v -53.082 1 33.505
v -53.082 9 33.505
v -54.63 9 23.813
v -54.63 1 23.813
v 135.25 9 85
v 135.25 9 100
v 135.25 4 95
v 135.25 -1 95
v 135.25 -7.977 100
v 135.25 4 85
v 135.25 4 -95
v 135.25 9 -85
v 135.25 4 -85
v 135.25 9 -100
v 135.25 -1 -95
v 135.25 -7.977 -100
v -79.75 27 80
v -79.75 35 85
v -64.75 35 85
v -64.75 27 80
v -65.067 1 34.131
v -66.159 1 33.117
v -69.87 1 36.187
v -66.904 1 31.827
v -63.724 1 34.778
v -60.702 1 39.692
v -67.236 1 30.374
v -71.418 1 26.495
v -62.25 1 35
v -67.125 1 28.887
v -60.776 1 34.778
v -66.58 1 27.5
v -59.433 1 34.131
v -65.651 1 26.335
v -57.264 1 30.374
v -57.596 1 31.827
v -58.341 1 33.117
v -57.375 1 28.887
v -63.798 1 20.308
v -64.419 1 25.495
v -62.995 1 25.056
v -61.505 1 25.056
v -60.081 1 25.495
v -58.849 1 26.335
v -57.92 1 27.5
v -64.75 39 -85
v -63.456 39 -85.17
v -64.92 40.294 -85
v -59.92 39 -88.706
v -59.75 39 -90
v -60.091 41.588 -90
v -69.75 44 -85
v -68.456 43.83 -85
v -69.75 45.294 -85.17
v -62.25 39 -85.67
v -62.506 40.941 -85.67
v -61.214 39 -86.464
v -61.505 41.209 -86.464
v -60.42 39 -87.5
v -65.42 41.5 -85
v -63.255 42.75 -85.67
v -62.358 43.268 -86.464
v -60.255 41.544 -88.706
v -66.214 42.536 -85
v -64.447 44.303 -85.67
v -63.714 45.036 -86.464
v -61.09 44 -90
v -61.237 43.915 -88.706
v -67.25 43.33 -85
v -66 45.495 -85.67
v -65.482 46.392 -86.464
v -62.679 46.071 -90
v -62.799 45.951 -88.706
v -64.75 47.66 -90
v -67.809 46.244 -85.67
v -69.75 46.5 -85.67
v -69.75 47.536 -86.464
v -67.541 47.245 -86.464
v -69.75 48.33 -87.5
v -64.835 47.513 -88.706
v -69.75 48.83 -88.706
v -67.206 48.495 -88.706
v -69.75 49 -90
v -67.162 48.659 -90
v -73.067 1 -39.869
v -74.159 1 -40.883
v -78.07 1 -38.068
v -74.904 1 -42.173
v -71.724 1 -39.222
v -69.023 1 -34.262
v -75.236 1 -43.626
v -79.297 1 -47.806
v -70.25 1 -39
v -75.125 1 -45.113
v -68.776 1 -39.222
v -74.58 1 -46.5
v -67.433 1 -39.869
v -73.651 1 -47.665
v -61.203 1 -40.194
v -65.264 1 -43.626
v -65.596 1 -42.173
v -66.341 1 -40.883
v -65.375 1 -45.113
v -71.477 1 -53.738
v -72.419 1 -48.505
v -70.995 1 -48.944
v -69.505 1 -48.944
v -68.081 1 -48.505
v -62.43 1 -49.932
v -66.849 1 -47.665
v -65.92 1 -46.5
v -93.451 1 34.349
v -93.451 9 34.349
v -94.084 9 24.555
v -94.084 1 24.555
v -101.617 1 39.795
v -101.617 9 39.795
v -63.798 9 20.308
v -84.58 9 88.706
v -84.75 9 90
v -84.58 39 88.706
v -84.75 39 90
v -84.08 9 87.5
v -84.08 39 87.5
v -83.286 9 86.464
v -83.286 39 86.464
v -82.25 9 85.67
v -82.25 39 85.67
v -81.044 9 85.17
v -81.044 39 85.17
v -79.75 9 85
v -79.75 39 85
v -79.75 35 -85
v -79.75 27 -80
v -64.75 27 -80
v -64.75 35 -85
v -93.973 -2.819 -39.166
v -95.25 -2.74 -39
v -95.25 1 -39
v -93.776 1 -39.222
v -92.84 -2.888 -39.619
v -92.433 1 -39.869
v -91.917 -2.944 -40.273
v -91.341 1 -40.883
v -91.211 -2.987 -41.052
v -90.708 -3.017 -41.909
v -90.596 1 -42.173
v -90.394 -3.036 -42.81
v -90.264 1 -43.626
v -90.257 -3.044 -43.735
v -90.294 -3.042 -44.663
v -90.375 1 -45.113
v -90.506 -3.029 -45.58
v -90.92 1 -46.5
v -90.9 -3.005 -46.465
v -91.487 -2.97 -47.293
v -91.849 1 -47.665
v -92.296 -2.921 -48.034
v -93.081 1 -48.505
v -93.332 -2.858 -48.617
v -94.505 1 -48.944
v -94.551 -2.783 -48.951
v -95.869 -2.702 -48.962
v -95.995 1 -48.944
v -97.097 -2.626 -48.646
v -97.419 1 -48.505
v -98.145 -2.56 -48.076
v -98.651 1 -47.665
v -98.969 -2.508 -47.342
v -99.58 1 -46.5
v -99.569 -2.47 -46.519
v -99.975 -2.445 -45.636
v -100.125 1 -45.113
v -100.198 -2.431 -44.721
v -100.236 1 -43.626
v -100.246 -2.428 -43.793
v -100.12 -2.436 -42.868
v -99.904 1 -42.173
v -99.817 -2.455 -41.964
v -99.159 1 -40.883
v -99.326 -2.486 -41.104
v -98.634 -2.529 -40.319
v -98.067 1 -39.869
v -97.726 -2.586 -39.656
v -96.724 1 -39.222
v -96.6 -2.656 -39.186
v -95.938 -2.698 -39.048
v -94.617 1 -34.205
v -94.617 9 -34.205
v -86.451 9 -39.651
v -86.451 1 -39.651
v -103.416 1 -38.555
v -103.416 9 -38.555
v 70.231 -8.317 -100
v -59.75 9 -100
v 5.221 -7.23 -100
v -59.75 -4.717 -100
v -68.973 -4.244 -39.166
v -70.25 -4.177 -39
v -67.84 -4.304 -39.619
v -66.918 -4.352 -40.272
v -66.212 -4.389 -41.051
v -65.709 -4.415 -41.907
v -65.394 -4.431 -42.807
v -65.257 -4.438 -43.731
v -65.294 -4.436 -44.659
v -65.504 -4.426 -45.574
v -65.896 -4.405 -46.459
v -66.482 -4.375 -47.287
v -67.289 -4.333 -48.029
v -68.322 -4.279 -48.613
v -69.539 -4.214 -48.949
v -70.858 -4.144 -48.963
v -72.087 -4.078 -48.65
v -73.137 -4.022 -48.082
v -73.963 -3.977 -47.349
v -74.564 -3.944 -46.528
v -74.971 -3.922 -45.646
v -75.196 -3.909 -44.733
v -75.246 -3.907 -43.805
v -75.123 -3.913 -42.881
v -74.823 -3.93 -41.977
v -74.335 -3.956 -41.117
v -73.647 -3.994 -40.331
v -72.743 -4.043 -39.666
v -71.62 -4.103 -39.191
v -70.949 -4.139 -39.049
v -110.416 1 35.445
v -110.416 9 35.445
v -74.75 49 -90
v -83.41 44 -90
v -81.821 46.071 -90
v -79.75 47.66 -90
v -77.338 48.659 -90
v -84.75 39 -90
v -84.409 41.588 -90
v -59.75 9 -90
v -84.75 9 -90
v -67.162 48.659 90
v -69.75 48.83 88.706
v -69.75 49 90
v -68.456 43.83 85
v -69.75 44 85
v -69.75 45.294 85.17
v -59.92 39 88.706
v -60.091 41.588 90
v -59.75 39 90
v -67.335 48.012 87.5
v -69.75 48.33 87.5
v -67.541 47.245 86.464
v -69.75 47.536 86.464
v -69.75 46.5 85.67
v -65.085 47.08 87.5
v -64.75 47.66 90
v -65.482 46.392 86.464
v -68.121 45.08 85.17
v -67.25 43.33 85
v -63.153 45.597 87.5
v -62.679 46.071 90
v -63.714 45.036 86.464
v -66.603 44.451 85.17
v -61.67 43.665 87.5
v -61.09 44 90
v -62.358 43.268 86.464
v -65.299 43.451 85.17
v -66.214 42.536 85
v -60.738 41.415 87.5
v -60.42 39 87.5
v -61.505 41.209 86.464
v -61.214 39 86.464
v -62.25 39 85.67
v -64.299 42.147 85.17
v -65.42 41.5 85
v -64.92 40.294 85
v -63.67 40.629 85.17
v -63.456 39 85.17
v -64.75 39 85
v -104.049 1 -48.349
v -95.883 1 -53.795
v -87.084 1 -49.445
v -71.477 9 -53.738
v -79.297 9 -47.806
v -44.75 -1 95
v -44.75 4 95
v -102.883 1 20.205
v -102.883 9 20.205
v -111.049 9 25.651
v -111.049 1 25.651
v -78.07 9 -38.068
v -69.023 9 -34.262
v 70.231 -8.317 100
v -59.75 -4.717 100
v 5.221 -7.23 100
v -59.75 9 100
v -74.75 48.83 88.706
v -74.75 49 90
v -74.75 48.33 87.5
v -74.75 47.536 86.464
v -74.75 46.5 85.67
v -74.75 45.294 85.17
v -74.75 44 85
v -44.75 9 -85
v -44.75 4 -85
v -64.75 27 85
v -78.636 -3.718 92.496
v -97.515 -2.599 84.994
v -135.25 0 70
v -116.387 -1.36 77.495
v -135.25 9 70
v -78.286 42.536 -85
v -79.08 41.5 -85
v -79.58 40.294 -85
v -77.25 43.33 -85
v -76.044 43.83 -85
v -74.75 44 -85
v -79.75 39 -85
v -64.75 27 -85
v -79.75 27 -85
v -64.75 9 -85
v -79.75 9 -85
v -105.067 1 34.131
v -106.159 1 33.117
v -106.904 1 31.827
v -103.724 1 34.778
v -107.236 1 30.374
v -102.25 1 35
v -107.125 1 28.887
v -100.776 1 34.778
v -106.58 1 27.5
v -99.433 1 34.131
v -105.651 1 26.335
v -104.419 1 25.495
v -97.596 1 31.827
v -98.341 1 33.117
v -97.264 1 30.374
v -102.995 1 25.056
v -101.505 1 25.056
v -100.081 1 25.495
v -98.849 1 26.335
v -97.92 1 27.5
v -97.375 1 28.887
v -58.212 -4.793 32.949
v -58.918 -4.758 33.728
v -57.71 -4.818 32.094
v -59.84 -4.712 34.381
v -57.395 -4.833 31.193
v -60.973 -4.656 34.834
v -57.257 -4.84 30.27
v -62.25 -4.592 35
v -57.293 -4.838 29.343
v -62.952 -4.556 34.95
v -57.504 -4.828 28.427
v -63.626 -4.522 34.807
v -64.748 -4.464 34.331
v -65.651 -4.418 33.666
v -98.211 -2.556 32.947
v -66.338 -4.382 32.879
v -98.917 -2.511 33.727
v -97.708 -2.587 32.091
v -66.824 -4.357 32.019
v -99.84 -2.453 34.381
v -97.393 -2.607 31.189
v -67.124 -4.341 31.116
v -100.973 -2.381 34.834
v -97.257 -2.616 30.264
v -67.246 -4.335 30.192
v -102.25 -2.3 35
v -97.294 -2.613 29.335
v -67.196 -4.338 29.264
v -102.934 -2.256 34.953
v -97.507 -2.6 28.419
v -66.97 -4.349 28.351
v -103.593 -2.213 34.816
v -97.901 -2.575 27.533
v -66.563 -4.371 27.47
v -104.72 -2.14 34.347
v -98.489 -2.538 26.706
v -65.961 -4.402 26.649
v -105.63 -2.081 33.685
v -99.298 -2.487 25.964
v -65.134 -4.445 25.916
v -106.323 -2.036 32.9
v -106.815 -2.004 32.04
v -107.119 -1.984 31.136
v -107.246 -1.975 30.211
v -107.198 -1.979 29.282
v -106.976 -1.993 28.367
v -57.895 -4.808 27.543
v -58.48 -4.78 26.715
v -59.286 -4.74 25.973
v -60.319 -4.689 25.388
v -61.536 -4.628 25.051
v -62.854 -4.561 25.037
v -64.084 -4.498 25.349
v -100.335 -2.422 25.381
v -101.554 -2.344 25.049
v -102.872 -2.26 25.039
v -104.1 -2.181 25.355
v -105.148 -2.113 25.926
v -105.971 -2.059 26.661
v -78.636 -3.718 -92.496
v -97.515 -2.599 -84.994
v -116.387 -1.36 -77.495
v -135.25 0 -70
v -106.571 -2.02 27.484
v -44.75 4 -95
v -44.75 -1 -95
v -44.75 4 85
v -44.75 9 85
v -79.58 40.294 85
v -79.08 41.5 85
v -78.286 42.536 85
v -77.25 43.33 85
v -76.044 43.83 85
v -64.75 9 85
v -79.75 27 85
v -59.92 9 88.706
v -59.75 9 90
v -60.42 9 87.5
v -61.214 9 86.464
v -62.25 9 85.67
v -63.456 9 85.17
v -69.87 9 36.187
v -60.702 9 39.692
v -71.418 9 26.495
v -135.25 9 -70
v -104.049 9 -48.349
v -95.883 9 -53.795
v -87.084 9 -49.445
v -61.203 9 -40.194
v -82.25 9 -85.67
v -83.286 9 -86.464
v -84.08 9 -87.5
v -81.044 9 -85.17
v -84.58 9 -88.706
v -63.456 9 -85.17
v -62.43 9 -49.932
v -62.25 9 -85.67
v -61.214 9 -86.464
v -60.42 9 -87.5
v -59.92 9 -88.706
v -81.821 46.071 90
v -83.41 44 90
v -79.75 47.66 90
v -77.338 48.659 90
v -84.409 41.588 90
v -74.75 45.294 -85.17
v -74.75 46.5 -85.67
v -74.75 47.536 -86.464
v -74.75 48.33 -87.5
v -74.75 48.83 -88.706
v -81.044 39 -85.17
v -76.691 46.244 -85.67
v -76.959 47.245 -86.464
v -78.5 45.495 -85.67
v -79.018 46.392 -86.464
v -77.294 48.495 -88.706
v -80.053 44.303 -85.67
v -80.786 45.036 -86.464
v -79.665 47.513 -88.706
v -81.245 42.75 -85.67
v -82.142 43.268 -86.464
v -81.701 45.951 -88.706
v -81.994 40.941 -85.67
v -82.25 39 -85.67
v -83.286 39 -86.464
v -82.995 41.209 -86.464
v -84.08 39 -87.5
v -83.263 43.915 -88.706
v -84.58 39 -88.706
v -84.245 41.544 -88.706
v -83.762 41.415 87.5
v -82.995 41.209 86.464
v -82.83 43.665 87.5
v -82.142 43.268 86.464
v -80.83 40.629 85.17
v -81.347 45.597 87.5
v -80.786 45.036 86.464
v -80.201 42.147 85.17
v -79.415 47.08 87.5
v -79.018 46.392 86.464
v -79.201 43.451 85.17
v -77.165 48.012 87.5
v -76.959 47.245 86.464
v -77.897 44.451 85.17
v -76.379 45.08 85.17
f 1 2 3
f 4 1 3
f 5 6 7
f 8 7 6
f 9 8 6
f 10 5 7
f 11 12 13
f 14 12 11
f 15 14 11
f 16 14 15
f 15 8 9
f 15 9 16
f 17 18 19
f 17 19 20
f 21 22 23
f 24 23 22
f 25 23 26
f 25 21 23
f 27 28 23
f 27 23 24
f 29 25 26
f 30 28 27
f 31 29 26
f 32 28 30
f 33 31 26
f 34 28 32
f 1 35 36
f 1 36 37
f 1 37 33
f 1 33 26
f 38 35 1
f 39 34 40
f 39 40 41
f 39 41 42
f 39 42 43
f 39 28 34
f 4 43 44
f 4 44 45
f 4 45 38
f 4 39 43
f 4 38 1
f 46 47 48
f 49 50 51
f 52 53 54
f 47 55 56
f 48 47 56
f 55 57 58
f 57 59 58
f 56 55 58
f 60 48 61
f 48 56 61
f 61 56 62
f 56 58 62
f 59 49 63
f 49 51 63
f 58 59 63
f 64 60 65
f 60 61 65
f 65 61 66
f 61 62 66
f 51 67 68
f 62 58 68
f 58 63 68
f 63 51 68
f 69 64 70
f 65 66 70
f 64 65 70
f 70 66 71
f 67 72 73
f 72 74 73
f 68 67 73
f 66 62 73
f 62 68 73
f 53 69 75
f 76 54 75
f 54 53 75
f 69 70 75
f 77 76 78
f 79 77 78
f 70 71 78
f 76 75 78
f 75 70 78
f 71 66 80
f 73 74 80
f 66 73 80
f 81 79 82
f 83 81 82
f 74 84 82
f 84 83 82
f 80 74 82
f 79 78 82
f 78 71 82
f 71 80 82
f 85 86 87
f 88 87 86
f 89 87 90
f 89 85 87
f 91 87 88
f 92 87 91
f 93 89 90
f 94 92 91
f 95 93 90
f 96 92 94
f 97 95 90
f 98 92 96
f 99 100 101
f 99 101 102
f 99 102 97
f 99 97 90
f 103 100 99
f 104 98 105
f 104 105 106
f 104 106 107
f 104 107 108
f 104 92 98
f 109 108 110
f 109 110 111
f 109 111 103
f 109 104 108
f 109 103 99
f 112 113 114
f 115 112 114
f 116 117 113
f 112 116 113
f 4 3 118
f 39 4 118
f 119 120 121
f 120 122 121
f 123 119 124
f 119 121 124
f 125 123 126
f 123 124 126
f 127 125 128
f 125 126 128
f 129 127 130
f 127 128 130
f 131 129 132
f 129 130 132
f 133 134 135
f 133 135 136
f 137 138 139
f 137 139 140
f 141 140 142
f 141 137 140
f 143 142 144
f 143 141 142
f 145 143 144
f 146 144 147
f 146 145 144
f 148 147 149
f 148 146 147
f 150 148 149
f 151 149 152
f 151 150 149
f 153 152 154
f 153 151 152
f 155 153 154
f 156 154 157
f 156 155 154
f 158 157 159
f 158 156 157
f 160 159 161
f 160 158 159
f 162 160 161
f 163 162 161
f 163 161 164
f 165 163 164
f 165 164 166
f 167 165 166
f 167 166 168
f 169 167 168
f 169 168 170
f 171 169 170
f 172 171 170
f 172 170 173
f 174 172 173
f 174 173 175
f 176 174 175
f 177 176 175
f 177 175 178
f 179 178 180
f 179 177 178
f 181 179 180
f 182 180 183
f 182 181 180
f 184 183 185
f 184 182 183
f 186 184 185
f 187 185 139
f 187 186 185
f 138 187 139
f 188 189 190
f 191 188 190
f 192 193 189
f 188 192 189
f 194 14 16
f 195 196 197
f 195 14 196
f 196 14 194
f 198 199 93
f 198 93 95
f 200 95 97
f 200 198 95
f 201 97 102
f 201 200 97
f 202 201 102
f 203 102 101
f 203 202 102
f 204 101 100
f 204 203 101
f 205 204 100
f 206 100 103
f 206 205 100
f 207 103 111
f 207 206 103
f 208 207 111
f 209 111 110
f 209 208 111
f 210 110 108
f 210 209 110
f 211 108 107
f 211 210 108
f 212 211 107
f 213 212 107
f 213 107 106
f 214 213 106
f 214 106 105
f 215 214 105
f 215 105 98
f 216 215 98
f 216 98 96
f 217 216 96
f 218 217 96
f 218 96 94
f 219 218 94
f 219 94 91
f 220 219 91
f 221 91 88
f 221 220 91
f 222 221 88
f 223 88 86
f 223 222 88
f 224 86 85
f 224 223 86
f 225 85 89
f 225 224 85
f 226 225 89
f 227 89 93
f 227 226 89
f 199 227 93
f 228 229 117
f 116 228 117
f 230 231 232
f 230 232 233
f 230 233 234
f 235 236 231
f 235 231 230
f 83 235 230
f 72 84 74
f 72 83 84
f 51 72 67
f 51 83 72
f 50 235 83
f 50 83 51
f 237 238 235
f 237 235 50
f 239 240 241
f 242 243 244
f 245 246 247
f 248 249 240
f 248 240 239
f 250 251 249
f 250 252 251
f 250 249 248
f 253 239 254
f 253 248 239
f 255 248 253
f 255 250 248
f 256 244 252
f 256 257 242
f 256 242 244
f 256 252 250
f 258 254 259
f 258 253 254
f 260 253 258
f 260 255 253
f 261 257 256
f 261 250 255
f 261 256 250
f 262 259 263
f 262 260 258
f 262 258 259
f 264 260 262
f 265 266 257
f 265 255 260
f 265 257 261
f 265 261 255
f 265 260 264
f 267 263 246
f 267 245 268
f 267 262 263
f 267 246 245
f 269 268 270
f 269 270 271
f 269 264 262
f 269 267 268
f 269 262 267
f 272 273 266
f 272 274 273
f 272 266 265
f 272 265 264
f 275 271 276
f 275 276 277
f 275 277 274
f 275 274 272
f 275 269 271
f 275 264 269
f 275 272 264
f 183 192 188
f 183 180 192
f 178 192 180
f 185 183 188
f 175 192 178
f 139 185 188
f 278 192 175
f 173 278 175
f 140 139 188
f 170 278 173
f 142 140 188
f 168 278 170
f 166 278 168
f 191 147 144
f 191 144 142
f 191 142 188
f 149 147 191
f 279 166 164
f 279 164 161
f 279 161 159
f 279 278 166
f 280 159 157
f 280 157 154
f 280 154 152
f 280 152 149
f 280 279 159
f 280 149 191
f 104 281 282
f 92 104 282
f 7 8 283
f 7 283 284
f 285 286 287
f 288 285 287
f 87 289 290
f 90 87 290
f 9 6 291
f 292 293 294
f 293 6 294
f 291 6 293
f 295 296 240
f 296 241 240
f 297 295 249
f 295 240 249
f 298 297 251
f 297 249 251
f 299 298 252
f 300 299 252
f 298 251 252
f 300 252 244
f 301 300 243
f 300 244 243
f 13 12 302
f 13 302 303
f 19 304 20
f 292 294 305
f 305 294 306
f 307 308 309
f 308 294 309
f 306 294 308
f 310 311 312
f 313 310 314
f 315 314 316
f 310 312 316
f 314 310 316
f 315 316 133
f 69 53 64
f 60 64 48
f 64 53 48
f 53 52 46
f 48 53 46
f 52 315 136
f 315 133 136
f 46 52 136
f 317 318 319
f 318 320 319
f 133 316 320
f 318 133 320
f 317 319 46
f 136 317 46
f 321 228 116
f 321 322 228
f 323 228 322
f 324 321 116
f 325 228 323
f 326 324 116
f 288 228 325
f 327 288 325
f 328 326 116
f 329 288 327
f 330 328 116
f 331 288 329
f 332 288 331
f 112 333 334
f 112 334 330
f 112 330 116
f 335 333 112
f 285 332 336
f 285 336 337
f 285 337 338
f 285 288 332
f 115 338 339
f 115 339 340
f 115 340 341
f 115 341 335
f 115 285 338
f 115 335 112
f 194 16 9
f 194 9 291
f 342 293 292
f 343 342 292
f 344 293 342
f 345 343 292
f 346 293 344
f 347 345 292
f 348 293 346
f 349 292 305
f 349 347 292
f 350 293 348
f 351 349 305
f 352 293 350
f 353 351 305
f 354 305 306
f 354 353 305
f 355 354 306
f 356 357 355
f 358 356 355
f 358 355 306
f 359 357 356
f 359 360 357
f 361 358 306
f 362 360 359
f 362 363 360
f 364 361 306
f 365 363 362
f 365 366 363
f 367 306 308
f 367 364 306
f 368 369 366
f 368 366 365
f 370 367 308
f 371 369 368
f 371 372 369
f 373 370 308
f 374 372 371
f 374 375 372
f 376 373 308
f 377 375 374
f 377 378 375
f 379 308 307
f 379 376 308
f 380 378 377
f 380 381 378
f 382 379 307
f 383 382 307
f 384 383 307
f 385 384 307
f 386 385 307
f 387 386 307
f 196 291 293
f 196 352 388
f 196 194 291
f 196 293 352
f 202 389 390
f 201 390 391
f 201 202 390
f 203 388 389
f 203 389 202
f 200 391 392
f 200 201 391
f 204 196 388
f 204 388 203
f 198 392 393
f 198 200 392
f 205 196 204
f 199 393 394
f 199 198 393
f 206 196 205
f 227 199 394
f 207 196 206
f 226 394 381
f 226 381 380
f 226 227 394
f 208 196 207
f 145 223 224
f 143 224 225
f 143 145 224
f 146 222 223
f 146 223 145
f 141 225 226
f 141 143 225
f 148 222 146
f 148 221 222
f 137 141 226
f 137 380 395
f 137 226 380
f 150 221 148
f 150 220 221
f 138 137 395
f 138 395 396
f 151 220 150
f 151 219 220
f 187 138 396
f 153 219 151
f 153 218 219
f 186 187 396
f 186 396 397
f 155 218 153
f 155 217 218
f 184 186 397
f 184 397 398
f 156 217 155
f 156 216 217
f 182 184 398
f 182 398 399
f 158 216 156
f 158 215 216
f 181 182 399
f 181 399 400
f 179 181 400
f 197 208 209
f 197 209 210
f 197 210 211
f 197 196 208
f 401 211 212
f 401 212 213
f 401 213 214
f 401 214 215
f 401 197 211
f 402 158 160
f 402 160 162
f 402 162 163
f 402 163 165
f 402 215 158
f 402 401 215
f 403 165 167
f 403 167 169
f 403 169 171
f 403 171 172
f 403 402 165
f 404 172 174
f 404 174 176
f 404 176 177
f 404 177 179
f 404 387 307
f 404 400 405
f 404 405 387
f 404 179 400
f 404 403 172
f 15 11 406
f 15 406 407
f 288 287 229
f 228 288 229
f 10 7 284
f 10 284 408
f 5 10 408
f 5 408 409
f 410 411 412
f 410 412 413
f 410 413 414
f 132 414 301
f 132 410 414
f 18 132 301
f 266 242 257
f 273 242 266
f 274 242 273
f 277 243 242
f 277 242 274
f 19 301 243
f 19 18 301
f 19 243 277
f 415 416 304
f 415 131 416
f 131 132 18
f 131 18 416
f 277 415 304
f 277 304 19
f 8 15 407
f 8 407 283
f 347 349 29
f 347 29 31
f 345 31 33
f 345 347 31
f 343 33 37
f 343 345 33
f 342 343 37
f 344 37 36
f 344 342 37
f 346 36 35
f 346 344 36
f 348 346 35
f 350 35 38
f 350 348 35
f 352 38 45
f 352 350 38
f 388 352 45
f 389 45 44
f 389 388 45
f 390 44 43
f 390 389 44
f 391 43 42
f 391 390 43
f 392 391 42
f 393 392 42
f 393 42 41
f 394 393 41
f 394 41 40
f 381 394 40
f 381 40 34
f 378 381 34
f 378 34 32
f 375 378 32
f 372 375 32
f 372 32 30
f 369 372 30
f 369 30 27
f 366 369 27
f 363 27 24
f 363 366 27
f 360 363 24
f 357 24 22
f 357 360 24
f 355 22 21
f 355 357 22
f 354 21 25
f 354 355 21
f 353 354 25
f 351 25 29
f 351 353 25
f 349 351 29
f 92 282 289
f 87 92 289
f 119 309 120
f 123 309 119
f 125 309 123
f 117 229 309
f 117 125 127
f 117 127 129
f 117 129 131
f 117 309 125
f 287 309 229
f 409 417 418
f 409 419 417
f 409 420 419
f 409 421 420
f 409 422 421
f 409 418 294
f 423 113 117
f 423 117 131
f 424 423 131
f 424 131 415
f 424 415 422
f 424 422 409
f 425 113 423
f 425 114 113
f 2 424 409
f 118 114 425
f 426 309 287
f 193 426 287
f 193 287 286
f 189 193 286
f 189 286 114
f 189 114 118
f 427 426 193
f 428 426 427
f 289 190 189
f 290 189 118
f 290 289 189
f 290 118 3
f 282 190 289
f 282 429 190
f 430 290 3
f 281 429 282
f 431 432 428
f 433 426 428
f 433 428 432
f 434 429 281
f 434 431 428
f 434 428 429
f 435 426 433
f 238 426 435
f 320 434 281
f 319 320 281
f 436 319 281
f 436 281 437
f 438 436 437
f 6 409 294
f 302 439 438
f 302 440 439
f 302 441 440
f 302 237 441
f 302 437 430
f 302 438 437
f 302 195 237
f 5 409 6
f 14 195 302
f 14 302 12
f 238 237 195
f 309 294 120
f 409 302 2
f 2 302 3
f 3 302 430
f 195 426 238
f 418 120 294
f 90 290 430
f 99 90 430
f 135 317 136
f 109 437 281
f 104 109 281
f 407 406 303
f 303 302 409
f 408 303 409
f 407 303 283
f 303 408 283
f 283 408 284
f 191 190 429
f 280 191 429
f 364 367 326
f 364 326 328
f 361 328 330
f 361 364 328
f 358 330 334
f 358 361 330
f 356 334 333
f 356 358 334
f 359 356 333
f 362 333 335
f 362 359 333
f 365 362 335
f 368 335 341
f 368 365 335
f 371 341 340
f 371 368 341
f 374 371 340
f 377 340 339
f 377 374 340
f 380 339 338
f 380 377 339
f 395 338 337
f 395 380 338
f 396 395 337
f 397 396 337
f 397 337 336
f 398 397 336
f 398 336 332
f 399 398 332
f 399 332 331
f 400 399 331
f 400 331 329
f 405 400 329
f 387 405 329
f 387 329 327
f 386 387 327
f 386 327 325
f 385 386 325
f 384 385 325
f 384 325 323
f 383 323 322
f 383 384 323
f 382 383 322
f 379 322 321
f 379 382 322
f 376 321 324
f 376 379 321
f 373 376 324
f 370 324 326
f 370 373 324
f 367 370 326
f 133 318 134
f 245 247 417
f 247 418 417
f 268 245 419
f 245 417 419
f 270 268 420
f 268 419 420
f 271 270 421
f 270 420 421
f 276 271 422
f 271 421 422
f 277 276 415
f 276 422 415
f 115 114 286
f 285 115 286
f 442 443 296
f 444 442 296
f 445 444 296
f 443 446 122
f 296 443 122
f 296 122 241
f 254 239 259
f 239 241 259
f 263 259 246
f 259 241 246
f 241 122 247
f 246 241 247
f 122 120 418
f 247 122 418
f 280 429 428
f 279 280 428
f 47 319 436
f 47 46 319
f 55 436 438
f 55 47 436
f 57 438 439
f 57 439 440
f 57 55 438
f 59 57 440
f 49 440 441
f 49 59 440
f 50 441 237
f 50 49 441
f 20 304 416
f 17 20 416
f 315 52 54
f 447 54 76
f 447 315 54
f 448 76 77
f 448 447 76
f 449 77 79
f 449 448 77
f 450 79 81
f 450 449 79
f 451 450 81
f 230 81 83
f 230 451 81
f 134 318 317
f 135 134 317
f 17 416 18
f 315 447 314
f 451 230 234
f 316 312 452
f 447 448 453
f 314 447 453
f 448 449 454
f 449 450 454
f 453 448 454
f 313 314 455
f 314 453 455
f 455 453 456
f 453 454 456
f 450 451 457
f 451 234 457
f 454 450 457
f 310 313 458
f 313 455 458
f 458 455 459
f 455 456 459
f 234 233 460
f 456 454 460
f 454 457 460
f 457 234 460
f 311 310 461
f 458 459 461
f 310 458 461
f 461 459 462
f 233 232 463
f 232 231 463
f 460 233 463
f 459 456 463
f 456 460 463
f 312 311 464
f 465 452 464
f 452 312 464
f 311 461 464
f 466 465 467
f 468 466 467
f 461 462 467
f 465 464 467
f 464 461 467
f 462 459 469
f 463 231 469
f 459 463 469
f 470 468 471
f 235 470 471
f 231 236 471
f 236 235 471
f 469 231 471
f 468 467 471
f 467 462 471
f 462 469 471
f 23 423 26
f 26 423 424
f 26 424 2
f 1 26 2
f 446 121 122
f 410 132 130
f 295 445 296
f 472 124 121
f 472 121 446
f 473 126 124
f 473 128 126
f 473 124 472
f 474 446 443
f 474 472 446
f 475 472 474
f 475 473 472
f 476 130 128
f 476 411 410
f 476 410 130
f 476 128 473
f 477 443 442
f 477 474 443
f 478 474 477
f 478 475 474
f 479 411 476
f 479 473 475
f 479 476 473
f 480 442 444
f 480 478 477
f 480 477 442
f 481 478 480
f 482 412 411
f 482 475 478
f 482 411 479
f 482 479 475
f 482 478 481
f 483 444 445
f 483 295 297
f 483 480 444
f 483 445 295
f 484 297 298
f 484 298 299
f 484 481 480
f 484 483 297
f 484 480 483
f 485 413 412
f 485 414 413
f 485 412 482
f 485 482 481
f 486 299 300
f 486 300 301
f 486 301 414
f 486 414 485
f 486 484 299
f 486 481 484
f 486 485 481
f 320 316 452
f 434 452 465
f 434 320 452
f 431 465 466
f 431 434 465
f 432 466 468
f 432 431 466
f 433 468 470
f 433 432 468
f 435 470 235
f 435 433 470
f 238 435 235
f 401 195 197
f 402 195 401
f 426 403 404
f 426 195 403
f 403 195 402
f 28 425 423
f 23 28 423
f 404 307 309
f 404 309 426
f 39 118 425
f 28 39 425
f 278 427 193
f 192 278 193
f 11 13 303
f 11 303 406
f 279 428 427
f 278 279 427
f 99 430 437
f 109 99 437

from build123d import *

# Parameters (mm, degrees)
SKETCH1_W                = 270.5
SKETCH1_H                = 200
MAINBODY_DEPTH           = 9
MAINBODYCURVE_DEPTH      = 100
MAINBODYCURVE_DEPTH_BACK = 100
BOLTHOLE_DEPTH           = 170.097967804
BOLTHOLE_DEPTH_BACK      = 170.097967804
SKETCH5_R                = 5
BOLTHEXHOLE_DEPTH        = 8
SLIDECUT_DEPTH           = 180
SKETCH18_W               = 25
SKETCH18_H               = 5
TABS_DEPTH               = 40
SKETCH19_W               = 15
SKETCH19_H               = 8
TABTRIANGLE1_DEPTH       = 5
TABTRIANGLECUT1_REACH    = 244.128
FILLET1_R                = 10
FILLET2_R                = 5
SKETCH21_W               = 15
SKETCH21_H               = 8
TABTRIANGLE2_DEPTH       = 5
TABTRIANGLECUT2_REACH    = 244.128
FILLET3_R                = 10
FILLET4_R                = 5
CUT_EXTRUDE15_DEPTH      = 173.89465737


with BuildPart() as part:
    # Sketch1 → MainBody (new body)
    with BuildSketch(Plane(origin=(0, 0, 0), x_dir=(1, 0, 0), z_dir=(0, 1, 0))):
        Rectangle(SKETCH1_W, SKETCH1_H)
    extrude(amount=MAINBODY_DEPTH)

    # Sketch12 → MainBodyCurve (add, two sides: drawn at the far end of the back side and taken through both)
    with BuildSketch(Plane.XY.offset(-MAINBODYCURVE_DEPTH_BACK)):
        with BuildLine():
            Line((135.25, 0), (135.25, -7.976686934))
            ThreePointArc((135.25, -7.976686934), (-0.091109356, -7.0779822), (-135.25, 0))
            Line((-135.25, 0), (135.25, 0))
        make_face()
    extrude(amount=MAINBODYCURVE_DEPTH + MAINBODYCURVE_DEPTH_BACK)

    # Sketch5 → BoltHole (cut, two sides: drawn at the far end of the back side and taken through both)
    with BuildSketch(Plane(origin=(0, 9, 0), x_dir=(1, 0, 0), z_dir=(0, 1, 0)).offset(-BOLTHOLE_DEPTH_BACK)):
        with Locations(Location((-102.25, -30, 0), (0, 0, 270))):
            Circle(SKETCH5_R)
        with Locations(Location((-95.25, 44, 0), (0, 0, 270))):
            Circle(SKETCH5_R)
        with Locations(Location((-70.25, 44, 0), (0, 0, 270))):
            Circle(SKETCH5_R)
        with Locations(Location((-62.25, -30, 0), (0, 0, 270))):
            Circle(SKETCH5_R)
    extrude(amount=BOLTHOLE_DEPTH + BOLTHOLE_DEPTH_BACK, mode=Mode.SUBTRACT)

    # Sketch13 → BoltHexHole (cut)
    with BuildSketch(Plane(origin=(0, 9, 0), x_dir=(1, 0, 0), z_dir=(0, 1, 0))):
        Polygon((-87.083976342, 49.445125431), (-95.882605121, 53.794546651), (-104.048628779, 48.34942122), (-103.416023658, 38.554874569), (-94.617394879, 34.205453349), (-86.451371221, 39.65057878), align=None)
        Polygon((-62.430442888, 49.931935595), (-71.477428362, 53.737902903), (-79.296985475, 47.805967308), (-78.069557112, 38.068064405), (-69.022571638, 34.262097097), (-61.203014525, 40.194032692), align=None)
        Polygon((-94.083976342, -24.554874569), (-102.882605121, -20.205453349), (-111.048628779, -25.65057878), (-110.416023658, -35.445125431), (-101.617394879, -39.794546651), (-93.451371221, -34.34942122), align=None)
        Polygon((-54.630390383, -23.813330248), (-63.798008362, -20.307889629), (-71.417617978, -26.494559381), (-69.869609617, -36.186669752), (-60.701991638, -39.692110371), (-53.082382022, -33.505440619), align=None)
    extrude(amount=-BOLTHEXHOLE_DEPTH, mode=Mode.SUBTRACT)

    # Sketch15 → SlideCut (cut)
    with BuildSketch(Plane(origin=(135.25, 0, 0), x_dir=(0, 0, -1), z_dir=(1, 0, 0))):
        Polygon((-85, 14), (85, 14), (85, 4), (95, 4), (95, -1), (-95, -1), (-95, 4), (-85, 4), align=None)
    extrude(amount=-SLIDECUT_DEPTH, mode=Mode.SUBTRACT)

    # Sketch18 → Tabs (add)
    with BuildSketch(Plane(origin=(0, 9, 0), x_dir=(1, 0, 0), z_dir=(0, 1, 0))):
        with Locations((-72.25, -87.5)):
            Rectangle(SKETCH18_W, SKETCH18_H)
        with Locations((-72.25, 87.5)):
            Rectangle(SKETCH18_W, SKETCH18_H)
    extrude(amount=TABS_DEPTH)

    # Sketch19 → TabTriangle1 (add)
    with BuildSketch(Plane(origin=(0, 0, 85), x_dir=(-1, 0, 0), z_dir=(0, 0, -1))):
        with Locations((72.25, 31)):
            Rectangle(SKETCH19_W, SKETCH19_H)
    extrude(amount=TABTRIANGLE1_DEPTH)

    # Sketch20 → TabTriangleCut1 (cut, up to next)
    with BuildSketch(Plane.ZY.offset(79.75), mode=Mode.PRIVATE) as tabtrianglecut1_sk1:
        Polygon((85, 35), (80, 27), (80, 35), align=None)
    tabtrianglecut1_tool1 = extrude(tabtrianglecut1_sk1.sketch, amount=-TABTRIANGLECUT1_REACH, mode=Mode.PRIVATE) & part.part
    add(tabtrianglecut1_tool1.solids().sort_by_distance((-79.75, 32.333333, 81.666667))[0], mode=Mode.SUBTRACT)

    # Fillet1
    fillet1_edges = [part.edges().sort_by_distance(p)[0] for p in [
        (-84.75, 49, 87.5),
        (-59.75, 49, 87.5),
    ]]
    fillet(fillet1_edges, radius=FILLET1_R)

    # Fillet2
    fillet2_edges = [part.edges().sort_by_distance(p)[0] for p in [
        (-84.75, 24, 85),
        (-59.75, 24, 85),
        (-62.678932188, 46.071067812, 85),
        (-72.25, 49, 85),
        (-81.821067812, 46.071067812, 85),
    ]]
    fillet(fillet2_edges, radius=FILLET2_R - 0.0001)  # a hair under: the kernel refuses the full size

    # Sketch21 → TabTriangle2 (add)
    with BuildSketch(Plane.XY.offset(-85)):
        with Locations((-72.25, 31)):
            Rectangle(SKETCH21_W, SKETCH21_H)
    extrude(amount=TABTRIANGLE2_DEPTH)

    # Sketch22 → TabTriangleCut2 (cut, up to next)
    with BuildSketch(Plane.ZY.offset(79.75), mode=Mode.PRIVATE) as tabtrianglecut2_sk1:
        Polygon((-80, 27), (-85, 35), (-80, 35), align=None)
    tabtrianglecut2_tool1 = extrude(tabtrianglecut2_sk1.sketch, amount=-TABTRIANGLECUT2_REACH, mode=Mode.PRIVATE) & part.part
    add(tabtrianglecut2_tool1.solids().sort_by_distance((-79.75, 32.333333, -81.666667))[0], mode=Mode.SUBTRACT)

    # Fillet3
    fillet3_edges = [part.edges().sort_by_distance(p)[0] for p in [
        (-84.75, 49, -87.5),
        (-59.75, 49, -87.5),
    ]]
    fillet(fillet3_edges, radius=FILLET3_R)

    # Fillet4
    fillet4_edges = [part.edges().sort_by_distance(p)[0] for p in [
        (-59.75, 24, -85),
        (-62.678932188, 46.071067812, -85),
        (-72.25, 49, -85),
        (-84.75, 24, -85),
        (-81.821067812, 46.071067812, -85),
    ]]
    fillet(fillet4_edges, radius=FILLET4_R - 0.0001)  # a hair under: the kernel refuses the full size

    # Sketch27 → Cut-Extrude15 (cut, through all)
    with BuildSketch(Plane(origin=(0, 9, 0), x_dir=(1, 0, 0), z_dir=(0, 1, 0))):
        Polygon((-59.75, 100), (-135.25, 70), (-135.25, 100), align=None)
        Polygon((-59.75, -100), (-135.25, -70), (-135.25, -100), align=None)
    extrude(amount=-CUT_EXTRUDE15_DEPTH, mode=Mode.SUBTRACT)


solid = part.part
